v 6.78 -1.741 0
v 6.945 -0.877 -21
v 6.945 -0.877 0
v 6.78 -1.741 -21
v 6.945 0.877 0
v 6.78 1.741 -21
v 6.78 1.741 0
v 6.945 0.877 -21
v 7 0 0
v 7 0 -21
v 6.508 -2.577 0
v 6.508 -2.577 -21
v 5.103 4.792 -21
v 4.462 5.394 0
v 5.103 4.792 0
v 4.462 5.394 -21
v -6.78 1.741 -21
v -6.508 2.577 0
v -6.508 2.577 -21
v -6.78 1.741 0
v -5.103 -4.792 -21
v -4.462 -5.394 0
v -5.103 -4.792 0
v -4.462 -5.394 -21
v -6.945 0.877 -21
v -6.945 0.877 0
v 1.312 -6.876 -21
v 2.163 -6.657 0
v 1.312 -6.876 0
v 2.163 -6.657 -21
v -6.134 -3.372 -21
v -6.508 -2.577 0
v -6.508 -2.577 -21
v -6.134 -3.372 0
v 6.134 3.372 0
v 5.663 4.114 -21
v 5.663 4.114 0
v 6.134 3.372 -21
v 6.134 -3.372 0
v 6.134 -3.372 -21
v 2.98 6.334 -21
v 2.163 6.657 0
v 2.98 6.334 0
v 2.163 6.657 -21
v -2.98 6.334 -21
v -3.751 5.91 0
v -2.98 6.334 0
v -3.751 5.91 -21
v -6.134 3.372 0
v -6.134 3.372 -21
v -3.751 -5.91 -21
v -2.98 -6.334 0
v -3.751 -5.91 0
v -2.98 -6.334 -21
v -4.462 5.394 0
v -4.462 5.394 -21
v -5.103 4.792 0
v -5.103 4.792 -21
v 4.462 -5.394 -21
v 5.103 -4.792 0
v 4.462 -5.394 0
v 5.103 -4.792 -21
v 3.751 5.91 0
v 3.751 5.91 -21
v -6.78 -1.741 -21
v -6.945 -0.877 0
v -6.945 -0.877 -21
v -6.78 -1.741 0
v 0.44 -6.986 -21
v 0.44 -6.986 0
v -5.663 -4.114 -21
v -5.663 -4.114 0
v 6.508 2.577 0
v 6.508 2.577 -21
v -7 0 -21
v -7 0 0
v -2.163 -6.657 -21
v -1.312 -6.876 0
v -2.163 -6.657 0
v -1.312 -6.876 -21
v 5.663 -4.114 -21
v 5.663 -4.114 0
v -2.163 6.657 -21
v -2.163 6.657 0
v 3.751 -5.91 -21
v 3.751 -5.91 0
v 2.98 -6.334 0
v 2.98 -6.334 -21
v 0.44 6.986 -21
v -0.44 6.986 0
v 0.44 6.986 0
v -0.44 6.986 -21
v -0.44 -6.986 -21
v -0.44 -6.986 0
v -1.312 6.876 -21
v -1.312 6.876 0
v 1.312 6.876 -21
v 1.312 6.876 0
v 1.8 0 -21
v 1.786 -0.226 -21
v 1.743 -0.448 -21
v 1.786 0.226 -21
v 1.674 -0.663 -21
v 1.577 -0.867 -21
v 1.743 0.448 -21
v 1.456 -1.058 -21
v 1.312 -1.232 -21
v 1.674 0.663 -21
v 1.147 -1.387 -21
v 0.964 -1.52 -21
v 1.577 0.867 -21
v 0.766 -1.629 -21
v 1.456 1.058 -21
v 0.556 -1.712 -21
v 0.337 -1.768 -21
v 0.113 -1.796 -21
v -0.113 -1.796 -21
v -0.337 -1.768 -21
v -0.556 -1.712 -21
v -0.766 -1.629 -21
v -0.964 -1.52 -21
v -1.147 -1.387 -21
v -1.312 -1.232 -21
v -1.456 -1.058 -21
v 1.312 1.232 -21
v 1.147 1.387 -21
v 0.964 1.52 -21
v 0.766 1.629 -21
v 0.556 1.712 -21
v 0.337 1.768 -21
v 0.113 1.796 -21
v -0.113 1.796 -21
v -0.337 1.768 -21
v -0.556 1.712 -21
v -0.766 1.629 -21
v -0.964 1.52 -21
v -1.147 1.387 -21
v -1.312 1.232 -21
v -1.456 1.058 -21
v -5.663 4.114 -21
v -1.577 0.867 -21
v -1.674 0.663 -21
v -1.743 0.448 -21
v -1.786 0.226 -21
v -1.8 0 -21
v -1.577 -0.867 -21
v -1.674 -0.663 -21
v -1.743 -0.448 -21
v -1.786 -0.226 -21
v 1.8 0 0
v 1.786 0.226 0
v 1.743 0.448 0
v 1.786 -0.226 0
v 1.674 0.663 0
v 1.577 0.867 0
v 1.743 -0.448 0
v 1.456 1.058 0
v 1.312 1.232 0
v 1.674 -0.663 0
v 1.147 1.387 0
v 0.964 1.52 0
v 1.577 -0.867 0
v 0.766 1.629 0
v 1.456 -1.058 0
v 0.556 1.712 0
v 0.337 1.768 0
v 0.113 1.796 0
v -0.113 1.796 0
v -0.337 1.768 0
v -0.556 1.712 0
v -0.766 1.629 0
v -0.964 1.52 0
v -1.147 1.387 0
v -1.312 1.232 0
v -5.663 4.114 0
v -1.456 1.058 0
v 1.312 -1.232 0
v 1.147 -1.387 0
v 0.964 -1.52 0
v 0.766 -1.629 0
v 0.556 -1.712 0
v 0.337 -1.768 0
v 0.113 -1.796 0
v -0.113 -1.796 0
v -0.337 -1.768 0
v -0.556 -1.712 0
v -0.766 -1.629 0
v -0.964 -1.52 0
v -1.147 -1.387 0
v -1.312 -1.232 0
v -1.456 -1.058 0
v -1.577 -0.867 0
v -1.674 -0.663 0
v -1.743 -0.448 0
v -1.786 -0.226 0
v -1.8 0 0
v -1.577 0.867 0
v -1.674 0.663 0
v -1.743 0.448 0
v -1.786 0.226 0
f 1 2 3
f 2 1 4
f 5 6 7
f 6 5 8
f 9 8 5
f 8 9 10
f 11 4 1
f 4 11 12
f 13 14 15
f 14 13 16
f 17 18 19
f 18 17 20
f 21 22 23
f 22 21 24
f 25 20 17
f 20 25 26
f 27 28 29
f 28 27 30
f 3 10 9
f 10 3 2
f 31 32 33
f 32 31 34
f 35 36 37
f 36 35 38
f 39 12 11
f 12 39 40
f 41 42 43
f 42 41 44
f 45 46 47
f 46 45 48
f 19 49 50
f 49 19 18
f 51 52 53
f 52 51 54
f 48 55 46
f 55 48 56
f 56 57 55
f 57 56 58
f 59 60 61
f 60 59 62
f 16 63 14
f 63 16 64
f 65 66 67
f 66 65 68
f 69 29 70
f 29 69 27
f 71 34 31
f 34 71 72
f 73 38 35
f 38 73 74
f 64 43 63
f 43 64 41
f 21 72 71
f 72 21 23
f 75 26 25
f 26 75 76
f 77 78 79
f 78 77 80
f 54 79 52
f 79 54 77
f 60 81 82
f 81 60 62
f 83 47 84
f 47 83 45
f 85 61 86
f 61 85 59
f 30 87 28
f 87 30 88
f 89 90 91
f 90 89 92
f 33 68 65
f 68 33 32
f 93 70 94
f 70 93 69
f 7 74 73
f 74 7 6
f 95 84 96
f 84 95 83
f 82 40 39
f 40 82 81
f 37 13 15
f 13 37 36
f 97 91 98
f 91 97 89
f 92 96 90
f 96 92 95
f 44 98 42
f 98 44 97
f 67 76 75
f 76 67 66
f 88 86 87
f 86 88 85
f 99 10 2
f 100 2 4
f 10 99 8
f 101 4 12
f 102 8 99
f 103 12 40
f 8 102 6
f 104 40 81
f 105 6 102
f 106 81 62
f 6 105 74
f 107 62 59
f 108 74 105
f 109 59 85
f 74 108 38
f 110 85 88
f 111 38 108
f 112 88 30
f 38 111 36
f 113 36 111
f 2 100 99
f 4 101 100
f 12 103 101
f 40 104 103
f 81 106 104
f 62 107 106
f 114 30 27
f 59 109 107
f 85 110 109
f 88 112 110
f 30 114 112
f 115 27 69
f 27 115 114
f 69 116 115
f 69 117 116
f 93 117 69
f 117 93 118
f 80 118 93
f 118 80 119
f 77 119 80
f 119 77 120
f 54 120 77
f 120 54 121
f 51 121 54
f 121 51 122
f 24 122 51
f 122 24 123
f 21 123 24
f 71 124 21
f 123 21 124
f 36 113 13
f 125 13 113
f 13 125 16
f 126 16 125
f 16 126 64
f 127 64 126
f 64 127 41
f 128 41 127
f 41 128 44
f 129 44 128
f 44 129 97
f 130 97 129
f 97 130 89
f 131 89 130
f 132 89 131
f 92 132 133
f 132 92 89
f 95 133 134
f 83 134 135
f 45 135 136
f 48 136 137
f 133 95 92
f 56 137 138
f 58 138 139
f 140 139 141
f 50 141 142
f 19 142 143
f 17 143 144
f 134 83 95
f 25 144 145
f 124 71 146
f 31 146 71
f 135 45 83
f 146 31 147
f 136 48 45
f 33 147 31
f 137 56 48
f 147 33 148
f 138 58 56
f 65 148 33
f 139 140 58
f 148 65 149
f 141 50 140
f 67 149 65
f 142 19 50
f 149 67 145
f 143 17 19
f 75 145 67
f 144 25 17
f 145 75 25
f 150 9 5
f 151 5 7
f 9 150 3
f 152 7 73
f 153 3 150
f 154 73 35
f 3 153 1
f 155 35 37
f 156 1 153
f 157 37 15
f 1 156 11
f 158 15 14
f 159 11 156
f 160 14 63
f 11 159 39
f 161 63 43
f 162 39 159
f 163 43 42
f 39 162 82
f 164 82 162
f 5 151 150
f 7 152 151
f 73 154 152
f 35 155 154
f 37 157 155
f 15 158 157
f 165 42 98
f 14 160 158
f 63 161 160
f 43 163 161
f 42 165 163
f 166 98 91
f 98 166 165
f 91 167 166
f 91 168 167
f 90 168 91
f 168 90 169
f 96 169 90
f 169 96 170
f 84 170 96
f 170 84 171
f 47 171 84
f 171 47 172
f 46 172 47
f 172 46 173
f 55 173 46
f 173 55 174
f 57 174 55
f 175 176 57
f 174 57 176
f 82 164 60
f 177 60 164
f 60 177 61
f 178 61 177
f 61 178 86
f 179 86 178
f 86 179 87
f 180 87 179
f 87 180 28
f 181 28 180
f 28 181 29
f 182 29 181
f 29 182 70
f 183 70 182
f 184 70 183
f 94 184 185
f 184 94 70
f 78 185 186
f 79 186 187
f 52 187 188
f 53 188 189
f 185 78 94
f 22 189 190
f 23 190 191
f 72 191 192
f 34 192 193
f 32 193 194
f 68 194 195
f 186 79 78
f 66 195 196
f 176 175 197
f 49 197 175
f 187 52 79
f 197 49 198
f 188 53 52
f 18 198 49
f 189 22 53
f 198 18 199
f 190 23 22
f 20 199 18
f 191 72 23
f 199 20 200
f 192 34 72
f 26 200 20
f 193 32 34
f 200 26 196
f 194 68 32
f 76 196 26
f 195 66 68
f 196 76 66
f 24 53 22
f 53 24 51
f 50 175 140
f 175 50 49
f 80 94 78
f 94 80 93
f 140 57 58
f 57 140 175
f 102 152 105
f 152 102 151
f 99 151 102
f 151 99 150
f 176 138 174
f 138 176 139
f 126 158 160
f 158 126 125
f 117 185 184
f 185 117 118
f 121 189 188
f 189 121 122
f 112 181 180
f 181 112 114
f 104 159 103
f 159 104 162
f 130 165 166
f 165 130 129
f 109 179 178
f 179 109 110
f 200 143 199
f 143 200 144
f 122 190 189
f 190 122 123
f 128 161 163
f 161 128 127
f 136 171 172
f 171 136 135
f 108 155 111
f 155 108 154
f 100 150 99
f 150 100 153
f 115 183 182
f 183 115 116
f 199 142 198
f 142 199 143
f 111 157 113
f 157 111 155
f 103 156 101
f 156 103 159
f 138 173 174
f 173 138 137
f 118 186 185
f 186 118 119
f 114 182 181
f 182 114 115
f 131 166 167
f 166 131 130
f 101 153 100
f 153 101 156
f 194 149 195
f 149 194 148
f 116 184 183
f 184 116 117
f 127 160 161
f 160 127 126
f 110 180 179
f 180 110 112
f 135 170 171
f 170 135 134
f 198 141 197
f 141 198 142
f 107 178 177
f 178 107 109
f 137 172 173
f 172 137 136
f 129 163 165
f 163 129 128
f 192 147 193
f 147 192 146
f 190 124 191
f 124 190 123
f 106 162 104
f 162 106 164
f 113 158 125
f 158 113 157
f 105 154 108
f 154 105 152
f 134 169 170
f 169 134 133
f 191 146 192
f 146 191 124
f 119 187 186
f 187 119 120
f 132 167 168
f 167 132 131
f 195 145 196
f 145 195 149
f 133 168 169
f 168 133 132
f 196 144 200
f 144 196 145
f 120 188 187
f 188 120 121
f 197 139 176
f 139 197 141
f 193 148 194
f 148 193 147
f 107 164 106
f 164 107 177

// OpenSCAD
$fn = 50;


difference() {
	union() {
		translate(v = [0, 0, -21.0000000000]) {
			cylinder(h = 21, r = 7.0000000000);
		}
		cylinder(h = 0, r = 10.0000000000);
	}
	union() {
		#translate(v = [0, 0, -21]) {
			cylinder(h = 21, r = 1.8000000000);
		}
	}
}
